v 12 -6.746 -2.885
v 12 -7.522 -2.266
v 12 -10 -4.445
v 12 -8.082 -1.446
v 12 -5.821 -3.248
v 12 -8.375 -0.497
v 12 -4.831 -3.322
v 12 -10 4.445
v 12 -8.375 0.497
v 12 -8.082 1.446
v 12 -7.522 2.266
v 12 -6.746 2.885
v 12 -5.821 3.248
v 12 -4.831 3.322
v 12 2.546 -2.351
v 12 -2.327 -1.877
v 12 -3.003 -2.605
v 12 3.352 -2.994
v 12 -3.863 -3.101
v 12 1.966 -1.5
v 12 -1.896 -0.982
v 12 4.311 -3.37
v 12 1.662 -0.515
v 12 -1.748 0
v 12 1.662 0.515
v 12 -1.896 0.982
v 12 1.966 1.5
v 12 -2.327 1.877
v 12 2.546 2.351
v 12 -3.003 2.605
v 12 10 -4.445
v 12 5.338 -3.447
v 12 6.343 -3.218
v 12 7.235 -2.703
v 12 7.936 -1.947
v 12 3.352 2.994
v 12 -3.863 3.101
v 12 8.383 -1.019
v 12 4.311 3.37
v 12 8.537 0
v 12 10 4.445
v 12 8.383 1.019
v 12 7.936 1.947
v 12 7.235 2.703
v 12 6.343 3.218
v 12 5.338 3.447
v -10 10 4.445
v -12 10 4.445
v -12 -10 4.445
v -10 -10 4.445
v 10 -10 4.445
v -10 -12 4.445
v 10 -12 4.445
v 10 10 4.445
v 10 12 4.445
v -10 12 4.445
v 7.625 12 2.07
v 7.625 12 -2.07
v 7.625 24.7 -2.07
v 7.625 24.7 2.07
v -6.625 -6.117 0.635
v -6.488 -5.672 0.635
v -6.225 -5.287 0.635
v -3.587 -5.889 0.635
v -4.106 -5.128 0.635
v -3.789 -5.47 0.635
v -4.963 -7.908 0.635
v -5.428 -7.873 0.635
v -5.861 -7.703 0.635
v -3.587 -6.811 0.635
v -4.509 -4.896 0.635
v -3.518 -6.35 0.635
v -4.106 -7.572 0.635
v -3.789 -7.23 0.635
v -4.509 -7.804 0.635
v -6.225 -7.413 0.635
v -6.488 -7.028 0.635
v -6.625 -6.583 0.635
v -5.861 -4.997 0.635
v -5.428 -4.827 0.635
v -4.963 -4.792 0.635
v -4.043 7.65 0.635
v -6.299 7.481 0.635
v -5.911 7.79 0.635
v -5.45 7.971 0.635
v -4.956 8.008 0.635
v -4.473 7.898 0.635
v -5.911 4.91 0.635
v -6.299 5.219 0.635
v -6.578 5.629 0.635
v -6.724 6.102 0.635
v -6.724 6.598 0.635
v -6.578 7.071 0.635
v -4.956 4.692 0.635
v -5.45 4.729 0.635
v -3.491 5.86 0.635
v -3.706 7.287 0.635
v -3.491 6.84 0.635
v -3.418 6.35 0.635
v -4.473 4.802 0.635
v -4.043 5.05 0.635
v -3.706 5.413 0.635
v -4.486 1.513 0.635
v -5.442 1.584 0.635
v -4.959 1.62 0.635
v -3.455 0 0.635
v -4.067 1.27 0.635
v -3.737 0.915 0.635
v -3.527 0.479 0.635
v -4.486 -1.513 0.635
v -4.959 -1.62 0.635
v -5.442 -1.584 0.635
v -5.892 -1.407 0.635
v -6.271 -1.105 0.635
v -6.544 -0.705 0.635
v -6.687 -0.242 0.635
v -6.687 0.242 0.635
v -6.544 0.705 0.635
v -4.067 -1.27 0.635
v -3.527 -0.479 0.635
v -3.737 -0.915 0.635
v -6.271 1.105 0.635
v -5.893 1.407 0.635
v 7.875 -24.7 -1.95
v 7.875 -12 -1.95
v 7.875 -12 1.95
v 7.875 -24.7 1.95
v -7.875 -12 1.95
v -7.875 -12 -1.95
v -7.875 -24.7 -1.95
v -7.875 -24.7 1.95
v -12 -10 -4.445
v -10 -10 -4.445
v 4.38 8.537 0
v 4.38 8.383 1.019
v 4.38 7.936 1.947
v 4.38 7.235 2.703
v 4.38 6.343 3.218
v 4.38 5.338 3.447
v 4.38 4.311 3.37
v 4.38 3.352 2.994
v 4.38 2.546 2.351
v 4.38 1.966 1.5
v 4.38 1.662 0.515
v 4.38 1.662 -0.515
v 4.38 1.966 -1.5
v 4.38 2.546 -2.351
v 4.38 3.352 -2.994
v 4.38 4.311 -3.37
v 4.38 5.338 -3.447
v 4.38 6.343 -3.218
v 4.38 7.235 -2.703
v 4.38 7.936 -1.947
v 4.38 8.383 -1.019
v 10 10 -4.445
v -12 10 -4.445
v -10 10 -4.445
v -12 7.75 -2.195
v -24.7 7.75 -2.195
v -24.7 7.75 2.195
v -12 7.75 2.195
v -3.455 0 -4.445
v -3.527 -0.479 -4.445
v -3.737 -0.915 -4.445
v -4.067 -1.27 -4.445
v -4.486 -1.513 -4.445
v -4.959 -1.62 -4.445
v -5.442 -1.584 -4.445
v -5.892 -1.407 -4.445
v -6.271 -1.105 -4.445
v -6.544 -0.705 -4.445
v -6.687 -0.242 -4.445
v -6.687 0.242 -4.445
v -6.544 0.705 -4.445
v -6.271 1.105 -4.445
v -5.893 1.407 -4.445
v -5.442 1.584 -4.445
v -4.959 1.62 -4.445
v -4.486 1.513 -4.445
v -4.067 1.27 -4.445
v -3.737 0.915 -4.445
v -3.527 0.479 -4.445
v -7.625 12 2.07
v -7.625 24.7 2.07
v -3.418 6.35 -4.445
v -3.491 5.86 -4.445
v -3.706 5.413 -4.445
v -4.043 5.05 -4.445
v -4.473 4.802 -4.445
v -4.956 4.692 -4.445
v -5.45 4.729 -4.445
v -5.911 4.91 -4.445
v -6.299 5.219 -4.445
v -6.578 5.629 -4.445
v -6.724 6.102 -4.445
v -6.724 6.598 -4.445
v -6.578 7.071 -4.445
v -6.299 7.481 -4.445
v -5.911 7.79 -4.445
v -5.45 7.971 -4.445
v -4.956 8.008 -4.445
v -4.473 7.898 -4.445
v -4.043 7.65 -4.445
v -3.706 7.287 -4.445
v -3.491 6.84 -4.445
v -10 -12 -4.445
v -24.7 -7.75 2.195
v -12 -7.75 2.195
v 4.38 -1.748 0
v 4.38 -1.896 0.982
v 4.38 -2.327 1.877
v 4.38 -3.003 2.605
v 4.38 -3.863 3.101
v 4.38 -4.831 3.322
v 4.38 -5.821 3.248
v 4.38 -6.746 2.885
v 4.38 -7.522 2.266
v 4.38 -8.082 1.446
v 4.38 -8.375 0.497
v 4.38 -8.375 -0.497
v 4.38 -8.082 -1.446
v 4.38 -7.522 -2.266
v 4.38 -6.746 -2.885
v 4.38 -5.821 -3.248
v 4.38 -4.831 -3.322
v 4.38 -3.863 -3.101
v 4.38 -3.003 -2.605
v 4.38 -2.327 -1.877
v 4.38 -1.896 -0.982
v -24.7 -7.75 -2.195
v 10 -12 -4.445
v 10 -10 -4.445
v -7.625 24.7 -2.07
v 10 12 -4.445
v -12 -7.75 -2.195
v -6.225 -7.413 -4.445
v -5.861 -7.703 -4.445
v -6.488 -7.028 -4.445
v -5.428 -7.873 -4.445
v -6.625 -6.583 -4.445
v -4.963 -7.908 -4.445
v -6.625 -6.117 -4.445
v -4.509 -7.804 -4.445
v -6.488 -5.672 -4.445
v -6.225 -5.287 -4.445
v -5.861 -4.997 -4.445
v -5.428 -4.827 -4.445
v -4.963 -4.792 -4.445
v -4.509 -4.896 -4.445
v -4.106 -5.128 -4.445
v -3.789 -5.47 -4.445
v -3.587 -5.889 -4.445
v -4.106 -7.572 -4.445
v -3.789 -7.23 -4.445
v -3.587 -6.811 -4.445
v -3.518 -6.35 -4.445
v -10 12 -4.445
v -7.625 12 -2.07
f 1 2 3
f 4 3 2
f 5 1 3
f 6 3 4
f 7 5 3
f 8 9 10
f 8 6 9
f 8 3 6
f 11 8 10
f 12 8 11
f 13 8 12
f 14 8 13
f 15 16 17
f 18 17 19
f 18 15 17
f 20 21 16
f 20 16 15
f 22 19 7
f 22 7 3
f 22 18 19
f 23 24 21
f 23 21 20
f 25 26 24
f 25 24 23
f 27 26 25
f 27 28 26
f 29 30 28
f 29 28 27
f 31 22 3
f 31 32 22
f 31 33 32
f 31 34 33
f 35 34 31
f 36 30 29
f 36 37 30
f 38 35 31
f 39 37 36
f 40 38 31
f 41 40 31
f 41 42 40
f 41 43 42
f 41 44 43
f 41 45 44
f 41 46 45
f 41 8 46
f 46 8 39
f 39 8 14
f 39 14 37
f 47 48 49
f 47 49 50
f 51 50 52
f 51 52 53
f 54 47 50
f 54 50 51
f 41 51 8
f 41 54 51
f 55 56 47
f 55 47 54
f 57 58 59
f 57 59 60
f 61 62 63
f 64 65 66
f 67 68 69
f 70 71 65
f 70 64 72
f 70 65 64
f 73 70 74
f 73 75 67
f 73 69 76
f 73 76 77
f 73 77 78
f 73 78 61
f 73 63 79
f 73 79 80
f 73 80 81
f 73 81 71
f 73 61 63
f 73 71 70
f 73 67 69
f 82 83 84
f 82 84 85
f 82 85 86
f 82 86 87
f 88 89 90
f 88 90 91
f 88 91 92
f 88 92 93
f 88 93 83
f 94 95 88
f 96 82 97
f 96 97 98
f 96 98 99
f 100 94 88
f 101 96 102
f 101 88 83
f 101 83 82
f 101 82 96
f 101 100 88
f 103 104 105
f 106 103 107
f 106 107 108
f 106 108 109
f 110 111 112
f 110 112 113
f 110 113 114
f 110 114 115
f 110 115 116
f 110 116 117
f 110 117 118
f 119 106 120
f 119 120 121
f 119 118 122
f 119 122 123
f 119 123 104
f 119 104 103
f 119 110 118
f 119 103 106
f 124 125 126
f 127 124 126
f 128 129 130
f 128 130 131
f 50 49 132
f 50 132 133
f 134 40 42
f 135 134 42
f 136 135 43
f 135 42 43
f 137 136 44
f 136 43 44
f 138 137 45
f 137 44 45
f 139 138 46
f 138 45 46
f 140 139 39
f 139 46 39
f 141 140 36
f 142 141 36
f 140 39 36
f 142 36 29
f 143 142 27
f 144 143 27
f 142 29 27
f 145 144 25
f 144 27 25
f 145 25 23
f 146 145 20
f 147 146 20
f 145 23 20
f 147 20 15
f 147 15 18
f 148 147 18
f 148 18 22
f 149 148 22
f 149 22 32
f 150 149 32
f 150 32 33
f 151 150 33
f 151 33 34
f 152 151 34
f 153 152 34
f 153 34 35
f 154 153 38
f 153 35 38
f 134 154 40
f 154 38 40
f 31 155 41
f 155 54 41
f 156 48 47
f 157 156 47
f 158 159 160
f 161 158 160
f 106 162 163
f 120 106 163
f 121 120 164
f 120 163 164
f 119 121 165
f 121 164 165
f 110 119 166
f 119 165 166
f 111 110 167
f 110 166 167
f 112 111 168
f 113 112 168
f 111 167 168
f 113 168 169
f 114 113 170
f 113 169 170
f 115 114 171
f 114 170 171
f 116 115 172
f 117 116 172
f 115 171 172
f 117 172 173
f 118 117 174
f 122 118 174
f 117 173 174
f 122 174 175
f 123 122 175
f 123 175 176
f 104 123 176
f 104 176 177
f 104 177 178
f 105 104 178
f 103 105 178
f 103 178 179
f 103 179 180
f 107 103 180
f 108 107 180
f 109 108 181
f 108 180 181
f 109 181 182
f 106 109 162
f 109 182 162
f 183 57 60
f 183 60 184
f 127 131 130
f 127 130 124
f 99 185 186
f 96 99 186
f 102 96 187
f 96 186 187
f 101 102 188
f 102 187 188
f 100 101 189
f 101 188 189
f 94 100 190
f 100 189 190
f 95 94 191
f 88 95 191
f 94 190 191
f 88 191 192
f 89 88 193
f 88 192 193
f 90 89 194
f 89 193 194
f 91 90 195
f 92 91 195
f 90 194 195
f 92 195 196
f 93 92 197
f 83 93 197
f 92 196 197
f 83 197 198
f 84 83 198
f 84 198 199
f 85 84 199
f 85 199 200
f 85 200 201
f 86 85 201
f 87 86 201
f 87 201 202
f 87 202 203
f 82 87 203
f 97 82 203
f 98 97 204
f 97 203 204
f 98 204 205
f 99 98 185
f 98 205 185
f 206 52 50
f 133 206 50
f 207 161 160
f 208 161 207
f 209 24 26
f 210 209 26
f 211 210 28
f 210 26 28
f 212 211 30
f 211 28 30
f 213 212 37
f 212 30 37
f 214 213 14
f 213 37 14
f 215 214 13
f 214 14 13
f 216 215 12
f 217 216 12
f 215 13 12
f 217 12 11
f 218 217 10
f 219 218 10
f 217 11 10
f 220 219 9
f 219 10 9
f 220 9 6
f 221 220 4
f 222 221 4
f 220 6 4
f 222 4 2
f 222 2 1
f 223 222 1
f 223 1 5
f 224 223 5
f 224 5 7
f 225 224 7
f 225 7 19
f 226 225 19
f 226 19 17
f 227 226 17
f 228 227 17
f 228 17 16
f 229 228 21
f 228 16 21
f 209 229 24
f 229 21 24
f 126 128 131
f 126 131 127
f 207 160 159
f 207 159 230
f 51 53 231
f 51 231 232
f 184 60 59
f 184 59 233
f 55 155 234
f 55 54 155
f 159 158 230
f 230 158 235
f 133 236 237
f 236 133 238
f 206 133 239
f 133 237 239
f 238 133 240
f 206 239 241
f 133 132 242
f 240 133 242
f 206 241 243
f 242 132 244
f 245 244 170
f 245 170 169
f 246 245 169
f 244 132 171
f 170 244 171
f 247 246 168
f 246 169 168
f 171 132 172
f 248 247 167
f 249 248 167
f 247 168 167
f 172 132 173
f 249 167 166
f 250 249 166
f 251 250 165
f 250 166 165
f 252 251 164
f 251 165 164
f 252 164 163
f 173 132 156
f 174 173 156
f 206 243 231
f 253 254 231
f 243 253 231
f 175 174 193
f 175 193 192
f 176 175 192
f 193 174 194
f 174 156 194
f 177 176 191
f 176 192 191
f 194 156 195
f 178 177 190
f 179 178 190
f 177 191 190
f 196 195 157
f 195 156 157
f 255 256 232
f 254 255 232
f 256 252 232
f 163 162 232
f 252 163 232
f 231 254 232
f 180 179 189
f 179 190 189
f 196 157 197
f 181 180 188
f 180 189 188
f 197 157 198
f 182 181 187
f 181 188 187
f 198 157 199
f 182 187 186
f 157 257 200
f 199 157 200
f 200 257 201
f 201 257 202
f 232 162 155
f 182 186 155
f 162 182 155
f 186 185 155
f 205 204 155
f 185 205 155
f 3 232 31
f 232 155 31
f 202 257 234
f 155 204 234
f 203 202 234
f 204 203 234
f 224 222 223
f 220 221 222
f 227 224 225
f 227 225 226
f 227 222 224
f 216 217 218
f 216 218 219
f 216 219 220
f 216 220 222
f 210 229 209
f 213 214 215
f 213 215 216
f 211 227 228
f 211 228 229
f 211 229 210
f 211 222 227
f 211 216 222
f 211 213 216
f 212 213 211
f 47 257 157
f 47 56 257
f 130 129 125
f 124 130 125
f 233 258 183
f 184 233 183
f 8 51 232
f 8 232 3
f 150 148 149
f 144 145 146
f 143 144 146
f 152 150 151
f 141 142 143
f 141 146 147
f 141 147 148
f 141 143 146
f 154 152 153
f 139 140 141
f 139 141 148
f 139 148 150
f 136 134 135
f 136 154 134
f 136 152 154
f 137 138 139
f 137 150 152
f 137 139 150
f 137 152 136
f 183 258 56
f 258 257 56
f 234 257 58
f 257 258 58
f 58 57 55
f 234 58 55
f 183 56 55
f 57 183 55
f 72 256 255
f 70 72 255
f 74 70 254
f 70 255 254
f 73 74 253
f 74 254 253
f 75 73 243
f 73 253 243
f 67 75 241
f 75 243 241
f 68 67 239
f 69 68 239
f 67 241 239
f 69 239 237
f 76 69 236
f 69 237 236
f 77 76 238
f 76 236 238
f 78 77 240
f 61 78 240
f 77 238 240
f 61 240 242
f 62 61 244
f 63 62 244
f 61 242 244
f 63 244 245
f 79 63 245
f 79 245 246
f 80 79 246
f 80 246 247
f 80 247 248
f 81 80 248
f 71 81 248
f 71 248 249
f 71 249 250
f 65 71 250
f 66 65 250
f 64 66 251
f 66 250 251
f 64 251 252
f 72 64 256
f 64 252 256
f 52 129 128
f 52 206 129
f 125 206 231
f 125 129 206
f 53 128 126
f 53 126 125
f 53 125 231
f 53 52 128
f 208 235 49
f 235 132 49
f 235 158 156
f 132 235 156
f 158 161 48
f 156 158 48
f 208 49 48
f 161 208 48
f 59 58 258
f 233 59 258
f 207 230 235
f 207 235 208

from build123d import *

# Parameters (mm, degrees)
F0_W      = 20
F0_H      = 2
F0_W_2    = 2
F0_H_2    = 20
F1_DEPTH  = 4.445
F2_W      = 15.5
F2_H      = 4.39
F3_DEPTH  = 12.7
F4_W      = 15.75
F4_H      = 3.9
F5_DEPTH  = 12.7
F6_W      = 15.25
F6_H      = 4.14
F7_DEPTH  = 12.7
F8_R      = 3.33175
F8_R_2    = 3.45675
F9_DEPTH  = 7.62
F10_R     = 1.6625
F10_R_2   = 1.625
F10_R_3   = 1.5625
F11_DEPTH = 5.08


with BuildPart() as f1:
    # F0 (on Top) → F1 (new body, symmetric)
    with BuildSketch(Plane.XY):
        with Locations((0, 11)):
            Rectangle(F0_W, F0_H)
        with Locations((11, 0)):
            Rectangle(F0_W_2, F0_H_2)
        Rectangle(F0_W, F0_H_2)
        with Locations((-11, 0)):
            Rectangle(F0_W_2, F0_H_2)
        with Locations((0, -11)):
            Rectangle(F0_W, F0_H)
    extrude(amount=F1_DEPTH, both=True)

    # F2 (on face) → F3 (join)
    with BuildSketch(Plane(origin=(-12, 0, 0), x_dir=(0, -1, 0), z_dir=(-1, 0, 0))):
        Rectangle(F2_W, F2_H)
    extrude(amount=F3_DEPTH)

    # F4 (on face) → F5 (join)
    with BuildSketch(Plane.XZ.offset(12)):
        Rectangle(F4_W, F4_H)
    extrude(amount=F5_DEPTH)

    # F6 (on face) → F7 (join)
    with BuildSketch(Plane(origin=(0, 12, 0), x_dir=(-1, 0, 0), z_dir=(0, 1, 0))):
        Rectangle(F6_W, F6_H)
    extrude(amount=F7_DEPTH)

    # F8 (on face) → F9 (cut)
    with BuildSketch(Plane.YZ.offset(12)):
        with Locations((-5.08, 0)):
            Circle(F8_R)
        with Locations((5.08, 0)):
            Circle(F8_R_2)
    extrude(amount=-F9_DEPTH, mode=Mode.SUBTRACT)

    # F10 (on face) → F11 (cut)
    with BuildSketch(Plane(origin=(0, 0, -4.445), x_dir=(1, 0, 0), z_dir=(0, 0, -1))):
        with Locations((-5.08, -6.35)):
            Circle(F10_R)
        with Locations((-5.08, 0)):
            Circle(F10_R_2)
        with Locations((-5.08, 6.35)):
            Circle(F10_R_3)
    extrude(amount=-F11_DEPTH, mode=Mode.SUBTRACT)


solid = f1.part
